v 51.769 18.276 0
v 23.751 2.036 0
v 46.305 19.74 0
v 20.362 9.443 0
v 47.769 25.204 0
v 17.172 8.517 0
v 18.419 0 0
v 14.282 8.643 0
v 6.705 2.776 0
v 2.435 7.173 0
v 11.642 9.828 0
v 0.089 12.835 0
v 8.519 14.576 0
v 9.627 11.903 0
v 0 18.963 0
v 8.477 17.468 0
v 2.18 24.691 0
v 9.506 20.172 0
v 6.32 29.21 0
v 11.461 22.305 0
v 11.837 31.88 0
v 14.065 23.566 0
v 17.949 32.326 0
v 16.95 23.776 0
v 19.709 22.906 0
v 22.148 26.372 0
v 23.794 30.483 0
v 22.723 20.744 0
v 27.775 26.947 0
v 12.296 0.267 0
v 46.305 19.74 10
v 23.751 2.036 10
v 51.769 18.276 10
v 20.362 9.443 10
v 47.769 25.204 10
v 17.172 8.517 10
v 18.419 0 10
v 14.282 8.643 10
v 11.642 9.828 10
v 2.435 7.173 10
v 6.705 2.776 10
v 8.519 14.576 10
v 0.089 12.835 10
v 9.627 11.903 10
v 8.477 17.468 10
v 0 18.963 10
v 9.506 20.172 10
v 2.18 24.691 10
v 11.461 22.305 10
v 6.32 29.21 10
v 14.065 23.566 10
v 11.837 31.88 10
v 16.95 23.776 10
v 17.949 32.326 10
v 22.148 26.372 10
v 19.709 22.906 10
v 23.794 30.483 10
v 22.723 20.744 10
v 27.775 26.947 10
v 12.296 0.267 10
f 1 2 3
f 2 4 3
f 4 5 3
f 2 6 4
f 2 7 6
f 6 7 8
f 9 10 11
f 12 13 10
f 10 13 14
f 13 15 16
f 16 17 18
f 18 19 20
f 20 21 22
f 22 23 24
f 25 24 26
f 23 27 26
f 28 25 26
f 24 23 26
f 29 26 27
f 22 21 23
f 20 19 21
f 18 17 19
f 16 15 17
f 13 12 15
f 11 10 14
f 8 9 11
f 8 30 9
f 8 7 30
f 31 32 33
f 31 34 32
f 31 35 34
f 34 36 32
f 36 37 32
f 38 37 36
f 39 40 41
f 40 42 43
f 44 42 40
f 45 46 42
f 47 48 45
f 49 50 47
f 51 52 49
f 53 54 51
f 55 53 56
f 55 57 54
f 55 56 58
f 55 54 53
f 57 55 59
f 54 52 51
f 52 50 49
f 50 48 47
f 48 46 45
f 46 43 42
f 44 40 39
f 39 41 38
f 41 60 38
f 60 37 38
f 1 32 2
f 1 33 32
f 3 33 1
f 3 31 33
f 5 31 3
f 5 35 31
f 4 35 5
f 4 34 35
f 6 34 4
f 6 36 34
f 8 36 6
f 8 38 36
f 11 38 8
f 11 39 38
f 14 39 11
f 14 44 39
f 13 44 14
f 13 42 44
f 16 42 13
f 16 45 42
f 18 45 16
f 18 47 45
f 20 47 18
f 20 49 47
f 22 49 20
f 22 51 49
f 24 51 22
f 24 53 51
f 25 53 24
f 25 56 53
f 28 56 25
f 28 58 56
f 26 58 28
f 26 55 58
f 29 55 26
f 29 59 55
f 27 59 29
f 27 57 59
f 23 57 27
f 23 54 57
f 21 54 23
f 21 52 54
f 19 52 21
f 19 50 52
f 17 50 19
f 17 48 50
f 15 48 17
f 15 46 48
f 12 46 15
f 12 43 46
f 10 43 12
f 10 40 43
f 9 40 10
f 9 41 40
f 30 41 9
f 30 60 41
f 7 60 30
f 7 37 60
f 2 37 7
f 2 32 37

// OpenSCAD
$fn = 32;

// ----------------------------------------------------------------------
// Eye lug: ring_tail, 10 mm thick
// ----------------------------------------------------------------------

// --- parameters (mm) ---
profile_height = 10;      // extrusion height
profile_points = 30;      // points of the closed outline

profile = [[22.148, 26.372], [27.775, 26.947], [23.794, 30.483], [17.949, 32.326], [11.837, 31.88], [6.32, 29.21], [2.18, 24.691], [0, 18.963], [0.089, 12.835], [2.435, 7.173], [6.705, 2.776], [12.296, 0.267], [18.419, 0], [23.751, 2.036], [51.769, 18.276], [46.305, 19.74], [47.769, 25.204], [20.362, 9.443], [17.172, 8.517], [14.282, 8.643], [11.642, 9.828], [9.627, 11.903], [8.519, 14.576], [8.477, 17.468], [9.506, 20.172], [11.461, 22.305], [14.065, 23.566], [16.95, 23.776], [19.709, 22.906], [22.723, 20.744]];  // single closed polygon, 30 points, counter clockwise

// --- the one profile operation ---
linear_extrude(height = profile_height) polygon(points = profile);
